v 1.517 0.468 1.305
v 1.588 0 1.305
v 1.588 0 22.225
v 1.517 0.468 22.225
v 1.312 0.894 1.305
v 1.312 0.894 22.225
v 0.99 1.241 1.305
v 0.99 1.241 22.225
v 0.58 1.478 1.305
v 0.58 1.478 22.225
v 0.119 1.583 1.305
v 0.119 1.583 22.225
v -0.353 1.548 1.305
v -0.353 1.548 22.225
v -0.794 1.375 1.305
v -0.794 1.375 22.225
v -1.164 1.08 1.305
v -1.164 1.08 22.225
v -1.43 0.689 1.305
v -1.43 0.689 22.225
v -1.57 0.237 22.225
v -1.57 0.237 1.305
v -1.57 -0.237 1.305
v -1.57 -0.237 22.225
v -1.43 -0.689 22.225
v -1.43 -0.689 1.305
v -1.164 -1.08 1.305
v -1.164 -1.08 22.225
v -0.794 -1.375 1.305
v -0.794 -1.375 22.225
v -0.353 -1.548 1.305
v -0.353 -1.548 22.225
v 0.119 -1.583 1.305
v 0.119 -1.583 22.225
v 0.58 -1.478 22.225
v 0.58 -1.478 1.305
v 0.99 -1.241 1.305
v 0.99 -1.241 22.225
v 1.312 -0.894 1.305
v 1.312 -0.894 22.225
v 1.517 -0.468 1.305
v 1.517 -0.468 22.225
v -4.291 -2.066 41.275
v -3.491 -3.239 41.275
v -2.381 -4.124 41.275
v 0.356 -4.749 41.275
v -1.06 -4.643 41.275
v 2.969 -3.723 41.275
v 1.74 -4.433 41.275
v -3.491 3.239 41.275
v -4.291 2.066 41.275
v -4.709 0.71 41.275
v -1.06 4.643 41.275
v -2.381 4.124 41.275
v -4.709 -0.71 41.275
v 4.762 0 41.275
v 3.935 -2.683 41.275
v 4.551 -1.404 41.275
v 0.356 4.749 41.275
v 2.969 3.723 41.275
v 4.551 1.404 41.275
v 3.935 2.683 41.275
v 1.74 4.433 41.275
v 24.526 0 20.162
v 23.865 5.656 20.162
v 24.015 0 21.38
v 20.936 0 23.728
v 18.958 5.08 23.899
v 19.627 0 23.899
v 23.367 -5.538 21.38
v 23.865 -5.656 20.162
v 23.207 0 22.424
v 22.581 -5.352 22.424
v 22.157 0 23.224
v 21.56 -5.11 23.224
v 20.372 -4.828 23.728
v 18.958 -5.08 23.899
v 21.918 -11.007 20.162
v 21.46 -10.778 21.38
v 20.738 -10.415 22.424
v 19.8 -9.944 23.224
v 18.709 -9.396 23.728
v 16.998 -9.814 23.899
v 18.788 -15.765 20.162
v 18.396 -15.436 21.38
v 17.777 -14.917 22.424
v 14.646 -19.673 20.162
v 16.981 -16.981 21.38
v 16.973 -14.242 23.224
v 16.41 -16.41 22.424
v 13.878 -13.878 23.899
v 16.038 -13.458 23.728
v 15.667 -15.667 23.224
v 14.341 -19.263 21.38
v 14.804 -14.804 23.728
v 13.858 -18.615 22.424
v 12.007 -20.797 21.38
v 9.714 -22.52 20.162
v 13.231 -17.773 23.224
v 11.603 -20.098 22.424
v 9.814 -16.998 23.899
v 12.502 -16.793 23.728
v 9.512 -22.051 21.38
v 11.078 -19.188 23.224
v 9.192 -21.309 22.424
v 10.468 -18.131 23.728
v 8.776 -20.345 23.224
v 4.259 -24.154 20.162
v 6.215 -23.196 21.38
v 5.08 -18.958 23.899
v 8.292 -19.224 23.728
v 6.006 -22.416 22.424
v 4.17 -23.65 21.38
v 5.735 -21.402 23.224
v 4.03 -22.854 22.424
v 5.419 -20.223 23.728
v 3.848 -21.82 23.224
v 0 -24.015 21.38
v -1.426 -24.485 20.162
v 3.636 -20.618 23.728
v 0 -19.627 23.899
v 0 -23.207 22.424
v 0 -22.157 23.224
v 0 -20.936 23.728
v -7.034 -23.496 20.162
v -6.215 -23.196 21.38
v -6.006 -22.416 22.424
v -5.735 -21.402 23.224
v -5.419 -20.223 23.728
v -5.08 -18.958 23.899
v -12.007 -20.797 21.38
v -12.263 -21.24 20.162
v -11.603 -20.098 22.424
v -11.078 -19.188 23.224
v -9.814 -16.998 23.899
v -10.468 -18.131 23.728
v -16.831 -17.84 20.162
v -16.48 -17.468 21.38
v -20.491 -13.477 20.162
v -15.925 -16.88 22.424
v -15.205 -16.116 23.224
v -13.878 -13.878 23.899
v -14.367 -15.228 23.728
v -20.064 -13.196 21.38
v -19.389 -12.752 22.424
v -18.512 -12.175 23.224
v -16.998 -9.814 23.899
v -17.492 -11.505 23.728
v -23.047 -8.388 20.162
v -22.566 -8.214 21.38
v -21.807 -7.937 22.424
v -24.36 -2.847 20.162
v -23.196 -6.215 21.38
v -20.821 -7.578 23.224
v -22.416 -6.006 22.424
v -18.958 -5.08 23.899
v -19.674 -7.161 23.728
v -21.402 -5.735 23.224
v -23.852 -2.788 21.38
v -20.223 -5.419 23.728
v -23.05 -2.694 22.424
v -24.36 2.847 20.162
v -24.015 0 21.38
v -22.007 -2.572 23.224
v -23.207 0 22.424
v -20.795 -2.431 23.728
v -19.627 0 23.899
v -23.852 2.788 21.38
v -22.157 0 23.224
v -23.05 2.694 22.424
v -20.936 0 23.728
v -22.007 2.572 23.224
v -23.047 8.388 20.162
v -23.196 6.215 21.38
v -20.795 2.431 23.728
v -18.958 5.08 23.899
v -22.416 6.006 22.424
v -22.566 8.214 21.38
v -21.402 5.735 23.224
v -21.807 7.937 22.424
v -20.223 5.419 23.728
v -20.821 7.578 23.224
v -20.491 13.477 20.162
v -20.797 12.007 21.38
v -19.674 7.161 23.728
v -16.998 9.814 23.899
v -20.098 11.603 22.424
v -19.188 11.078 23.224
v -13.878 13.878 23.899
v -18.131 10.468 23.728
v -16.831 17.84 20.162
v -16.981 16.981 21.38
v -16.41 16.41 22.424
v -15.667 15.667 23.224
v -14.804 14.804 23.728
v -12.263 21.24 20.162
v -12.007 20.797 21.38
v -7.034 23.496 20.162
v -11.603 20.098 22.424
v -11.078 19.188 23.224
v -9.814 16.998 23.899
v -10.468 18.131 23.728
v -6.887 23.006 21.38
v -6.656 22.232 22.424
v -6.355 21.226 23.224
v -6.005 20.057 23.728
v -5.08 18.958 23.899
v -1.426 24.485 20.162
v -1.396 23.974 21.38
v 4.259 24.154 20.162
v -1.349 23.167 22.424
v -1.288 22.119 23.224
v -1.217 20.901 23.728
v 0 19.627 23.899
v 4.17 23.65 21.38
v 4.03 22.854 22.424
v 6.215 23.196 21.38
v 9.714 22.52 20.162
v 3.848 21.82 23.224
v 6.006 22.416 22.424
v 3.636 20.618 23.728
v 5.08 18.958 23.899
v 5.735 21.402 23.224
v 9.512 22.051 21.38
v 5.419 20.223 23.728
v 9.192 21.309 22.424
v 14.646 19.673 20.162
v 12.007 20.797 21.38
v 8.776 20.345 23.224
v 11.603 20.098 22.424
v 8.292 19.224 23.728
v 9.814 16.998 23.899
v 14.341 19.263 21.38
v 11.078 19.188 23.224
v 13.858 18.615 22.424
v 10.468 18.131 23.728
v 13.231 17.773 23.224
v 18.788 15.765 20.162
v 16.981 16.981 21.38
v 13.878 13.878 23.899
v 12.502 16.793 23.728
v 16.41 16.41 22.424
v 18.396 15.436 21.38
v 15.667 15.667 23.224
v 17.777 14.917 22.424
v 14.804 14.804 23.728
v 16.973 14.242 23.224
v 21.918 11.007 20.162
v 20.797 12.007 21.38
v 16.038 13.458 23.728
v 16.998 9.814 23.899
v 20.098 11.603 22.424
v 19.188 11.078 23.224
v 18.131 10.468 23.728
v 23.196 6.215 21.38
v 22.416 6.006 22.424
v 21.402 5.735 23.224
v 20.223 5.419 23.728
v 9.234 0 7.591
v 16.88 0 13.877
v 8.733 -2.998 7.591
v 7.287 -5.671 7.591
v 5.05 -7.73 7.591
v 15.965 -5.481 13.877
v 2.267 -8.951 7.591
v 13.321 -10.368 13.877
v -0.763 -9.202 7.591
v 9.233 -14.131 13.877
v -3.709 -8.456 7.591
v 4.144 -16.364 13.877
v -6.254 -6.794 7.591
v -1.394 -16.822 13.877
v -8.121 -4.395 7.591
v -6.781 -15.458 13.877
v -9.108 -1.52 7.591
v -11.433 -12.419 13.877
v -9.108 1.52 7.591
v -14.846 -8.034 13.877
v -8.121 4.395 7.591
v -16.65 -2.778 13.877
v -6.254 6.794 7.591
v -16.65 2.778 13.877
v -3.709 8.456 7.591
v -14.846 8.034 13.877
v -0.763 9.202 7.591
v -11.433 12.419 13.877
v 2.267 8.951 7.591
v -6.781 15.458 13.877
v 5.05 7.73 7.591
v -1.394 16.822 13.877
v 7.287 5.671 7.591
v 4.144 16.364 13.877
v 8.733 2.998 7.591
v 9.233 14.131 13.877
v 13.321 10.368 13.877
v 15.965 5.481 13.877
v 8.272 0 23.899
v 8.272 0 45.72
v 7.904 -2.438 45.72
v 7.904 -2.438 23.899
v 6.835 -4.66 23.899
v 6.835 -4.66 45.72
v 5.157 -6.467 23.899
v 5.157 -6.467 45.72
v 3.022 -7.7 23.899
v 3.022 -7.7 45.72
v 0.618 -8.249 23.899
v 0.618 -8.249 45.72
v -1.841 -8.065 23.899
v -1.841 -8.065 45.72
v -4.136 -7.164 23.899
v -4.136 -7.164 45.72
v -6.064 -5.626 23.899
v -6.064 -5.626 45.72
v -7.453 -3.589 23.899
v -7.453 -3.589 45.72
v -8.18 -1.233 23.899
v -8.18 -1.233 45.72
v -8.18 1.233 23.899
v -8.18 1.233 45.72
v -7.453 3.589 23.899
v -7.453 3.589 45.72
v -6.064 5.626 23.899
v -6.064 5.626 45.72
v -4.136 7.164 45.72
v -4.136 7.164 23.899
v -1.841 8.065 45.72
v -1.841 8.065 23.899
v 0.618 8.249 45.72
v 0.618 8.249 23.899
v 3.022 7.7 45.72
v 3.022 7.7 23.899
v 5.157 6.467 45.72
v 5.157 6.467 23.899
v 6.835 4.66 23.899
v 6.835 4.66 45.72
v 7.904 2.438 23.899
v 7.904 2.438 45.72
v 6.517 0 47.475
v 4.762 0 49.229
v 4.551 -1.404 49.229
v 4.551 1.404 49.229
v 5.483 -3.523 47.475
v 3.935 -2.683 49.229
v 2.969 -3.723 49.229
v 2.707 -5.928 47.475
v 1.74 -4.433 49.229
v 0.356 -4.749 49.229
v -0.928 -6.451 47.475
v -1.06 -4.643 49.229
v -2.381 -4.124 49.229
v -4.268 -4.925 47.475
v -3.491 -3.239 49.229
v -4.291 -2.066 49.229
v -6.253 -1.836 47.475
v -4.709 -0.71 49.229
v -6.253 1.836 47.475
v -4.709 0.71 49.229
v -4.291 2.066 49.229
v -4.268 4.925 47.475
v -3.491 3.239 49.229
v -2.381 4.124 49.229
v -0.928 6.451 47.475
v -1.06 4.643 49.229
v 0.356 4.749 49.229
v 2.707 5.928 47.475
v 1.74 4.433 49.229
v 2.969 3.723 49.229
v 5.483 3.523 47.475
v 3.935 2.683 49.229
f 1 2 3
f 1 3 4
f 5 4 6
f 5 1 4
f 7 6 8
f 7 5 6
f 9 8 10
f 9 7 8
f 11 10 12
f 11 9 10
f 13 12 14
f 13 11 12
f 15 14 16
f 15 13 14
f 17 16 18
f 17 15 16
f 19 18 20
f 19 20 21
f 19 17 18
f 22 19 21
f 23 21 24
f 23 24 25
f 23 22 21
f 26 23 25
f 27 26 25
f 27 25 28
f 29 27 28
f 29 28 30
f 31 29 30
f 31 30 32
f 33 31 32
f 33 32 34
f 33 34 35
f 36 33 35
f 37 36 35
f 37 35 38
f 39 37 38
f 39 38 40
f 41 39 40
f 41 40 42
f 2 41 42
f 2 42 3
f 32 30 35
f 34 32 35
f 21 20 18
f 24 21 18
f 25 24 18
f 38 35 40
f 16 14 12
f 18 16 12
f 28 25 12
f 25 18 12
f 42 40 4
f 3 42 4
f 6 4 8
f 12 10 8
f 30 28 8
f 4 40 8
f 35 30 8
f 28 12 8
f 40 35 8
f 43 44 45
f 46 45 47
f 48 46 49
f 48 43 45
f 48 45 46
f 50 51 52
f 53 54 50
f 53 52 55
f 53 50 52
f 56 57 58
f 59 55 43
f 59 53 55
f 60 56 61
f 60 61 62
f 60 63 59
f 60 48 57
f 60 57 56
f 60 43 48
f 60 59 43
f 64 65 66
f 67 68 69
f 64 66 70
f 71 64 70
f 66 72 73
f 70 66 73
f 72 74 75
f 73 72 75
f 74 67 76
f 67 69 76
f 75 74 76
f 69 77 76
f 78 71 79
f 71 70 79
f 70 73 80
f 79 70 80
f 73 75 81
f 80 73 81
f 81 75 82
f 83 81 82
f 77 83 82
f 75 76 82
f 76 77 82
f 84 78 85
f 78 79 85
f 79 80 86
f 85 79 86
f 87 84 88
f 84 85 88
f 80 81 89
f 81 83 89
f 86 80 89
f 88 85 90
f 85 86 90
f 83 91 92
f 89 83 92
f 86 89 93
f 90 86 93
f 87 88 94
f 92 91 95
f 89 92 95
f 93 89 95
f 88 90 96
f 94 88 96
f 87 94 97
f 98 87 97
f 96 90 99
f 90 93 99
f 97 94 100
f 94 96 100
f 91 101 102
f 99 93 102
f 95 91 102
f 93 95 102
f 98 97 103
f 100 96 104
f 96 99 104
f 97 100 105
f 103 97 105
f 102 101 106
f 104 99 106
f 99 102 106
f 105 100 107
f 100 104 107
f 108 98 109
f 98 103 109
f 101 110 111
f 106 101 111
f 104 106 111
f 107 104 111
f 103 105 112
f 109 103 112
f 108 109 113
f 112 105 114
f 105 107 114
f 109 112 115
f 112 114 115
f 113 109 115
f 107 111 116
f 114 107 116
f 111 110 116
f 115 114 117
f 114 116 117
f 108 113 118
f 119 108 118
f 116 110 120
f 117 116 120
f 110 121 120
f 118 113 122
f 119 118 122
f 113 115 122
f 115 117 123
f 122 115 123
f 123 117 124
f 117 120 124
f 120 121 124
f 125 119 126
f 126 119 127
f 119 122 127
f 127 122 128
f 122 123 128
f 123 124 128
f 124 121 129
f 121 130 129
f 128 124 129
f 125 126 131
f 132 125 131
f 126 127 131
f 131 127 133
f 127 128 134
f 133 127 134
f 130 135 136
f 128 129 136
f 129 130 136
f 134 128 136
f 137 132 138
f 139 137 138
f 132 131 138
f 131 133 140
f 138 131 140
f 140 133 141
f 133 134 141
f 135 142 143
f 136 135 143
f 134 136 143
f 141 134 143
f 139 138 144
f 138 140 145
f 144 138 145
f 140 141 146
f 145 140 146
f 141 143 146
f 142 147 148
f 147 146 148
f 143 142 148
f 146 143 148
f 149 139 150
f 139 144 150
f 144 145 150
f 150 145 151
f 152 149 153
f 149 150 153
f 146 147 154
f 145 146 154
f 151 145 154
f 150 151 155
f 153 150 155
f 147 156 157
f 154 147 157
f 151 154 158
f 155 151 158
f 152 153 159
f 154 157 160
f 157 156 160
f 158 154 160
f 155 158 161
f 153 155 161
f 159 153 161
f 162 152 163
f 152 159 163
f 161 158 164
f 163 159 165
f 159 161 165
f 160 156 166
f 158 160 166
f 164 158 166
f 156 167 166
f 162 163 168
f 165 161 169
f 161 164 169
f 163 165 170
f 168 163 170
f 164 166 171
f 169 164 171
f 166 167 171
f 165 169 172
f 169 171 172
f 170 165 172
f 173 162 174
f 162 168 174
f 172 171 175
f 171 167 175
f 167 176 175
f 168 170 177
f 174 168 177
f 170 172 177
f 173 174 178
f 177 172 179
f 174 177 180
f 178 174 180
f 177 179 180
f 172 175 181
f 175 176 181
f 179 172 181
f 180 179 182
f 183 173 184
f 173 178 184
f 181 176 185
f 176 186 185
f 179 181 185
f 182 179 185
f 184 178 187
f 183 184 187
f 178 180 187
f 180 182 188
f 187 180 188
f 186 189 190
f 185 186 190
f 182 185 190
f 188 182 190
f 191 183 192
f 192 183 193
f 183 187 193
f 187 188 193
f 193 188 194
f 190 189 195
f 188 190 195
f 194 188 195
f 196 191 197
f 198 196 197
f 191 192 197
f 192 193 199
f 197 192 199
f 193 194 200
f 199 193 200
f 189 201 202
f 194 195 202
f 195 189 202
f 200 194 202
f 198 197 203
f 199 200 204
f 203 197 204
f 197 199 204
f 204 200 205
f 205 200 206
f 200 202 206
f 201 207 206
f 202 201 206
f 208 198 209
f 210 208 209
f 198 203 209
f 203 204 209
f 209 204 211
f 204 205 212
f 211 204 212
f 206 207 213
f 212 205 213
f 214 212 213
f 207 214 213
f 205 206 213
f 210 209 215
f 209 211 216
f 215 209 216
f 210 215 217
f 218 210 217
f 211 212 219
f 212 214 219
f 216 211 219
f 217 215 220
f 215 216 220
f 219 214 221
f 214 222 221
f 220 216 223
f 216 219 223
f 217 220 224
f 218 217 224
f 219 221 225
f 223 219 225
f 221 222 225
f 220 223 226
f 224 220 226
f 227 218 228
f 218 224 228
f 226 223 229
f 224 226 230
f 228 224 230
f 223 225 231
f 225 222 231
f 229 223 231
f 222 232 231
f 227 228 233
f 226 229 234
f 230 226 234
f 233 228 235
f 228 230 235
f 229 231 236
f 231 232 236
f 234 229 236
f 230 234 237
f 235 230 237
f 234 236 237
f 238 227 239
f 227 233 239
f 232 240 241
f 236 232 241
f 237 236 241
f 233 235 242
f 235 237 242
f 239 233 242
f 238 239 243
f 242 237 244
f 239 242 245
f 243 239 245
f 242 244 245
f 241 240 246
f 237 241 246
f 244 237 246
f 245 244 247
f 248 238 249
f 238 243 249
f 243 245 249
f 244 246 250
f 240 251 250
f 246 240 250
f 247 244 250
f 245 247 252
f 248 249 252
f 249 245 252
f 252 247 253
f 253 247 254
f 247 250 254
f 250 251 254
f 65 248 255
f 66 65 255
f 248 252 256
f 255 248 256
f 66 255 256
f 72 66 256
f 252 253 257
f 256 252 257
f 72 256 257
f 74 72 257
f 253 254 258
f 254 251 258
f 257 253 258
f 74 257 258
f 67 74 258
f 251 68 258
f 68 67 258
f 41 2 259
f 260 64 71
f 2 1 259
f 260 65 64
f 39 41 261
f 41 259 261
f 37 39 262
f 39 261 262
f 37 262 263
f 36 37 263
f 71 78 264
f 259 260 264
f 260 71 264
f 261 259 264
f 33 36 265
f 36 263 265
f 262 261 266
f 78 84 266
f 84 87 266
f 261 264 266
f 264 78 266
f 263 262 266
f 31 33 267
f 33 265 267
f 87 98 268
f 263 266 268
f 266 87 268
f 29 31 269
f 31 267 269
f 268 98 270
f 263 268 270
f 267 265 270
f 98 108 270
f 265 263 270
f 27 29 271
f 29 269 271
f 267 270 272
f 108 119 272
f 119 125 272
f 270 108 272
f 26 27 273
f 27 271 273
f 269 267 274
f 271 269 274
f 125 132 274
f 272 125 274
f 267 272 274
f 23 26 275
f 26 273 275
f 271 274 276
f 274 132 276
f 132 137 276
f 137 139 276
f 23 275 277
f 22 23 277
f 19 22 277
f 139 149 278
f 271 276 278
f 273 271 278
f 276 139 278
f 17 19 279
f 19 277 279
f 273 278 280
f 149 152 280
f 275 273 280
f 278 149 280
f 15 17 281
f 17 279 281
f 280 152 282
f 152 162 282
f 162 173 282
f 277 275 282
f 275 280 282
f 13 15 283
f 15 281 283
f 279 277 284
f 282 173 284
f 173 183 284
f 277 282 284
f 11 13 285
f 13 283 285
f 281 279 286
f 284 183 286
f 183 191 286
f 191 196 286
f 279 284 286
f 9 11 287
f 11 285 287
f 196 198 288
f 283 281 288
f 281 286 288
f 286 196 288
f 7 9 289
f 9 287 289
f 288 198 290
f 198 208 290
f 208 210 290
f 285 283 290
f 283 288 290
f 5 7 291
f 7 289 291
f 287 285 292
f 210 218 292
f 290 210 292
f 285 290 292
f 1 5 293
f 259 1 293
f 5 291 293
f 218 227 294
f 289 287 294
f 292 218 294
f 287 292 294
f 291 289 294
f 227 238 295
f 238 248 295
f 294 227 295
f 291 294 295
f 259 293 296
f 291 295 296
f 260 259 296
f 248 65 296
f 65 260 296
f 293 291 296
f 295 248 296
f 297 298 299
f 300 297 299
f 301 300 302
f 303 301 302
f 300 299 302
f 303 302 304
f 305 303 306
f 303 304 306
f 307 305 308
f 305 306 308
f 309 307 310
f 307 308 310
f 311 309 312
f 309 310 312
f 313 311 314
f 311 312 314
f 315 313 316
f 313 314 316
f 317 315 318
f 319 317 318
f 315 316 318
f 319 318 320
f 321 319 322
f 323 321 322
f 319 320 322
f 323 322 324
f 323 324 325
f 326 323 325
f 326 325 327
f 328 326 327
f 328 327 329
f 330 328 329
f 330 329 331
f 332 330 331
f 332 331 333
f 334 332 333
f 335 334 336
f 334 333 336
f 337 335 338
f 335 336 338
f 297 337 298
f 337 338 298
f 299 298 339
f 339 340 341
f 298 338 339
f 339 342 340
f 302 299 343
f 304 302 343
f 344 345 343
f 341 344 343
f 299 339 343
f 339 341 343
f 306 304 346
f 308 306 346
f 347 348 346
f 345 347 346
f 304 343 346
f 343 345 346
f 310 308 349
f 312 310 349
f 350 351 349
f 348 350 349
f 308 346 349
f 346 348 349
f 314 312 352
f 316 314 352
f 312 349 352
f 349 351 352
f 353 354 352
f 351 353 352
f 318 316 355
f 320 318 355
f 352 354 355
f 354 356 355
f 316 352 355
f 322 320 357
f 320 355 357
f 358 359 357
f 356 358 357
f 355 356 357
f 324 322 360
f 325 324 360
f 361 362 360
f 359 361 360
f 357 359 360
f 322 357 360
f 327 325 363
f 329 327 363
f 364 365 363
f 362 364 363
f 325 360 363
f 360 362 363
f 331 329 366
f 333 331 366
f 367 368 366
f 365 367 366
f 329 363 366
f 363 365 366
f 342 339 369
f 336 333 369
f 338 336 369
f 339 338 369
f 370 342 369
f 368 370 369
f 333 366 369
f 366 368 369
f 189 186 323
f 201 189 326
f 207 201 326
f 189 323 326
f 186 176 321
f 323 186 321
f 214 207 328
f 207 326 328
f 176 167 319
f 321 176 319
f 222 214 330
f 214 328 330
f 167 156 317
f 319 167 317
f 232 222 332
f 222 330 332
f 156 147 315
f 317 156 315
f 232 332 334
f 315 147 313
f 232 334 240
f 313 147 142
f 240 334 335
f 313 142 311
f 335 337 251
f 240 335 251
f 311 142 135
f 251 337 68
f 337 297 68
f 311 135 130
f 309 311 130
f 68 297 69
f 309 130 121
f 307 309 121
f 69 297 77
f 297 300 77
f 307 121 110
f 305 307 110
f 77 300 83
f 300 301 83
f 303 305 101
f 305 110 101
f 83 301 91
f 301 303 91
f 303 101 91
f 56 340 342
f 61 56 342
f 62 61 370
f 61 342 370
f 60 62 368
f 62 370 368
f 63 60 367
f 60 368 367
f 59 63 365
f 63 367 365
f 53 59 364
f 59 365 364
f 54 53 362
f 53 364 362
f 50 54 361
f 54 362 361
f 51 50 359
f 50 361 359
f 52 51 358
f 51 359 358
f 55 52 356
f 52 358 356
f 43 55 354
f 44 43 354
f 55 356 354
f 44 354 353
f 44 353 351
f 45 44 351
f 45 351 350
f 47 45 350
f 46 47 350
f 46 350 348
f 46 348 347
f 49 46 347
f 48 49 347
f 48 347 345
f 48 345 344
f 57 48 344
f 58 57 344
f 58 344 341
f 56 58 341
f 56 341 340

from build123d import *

# Parameters (mm, degrees)
F4_R     = 4.7625
F5_DEPTH = 9.525
F7_R     = 1.5875
F8_DEPTH = 22.225


# Not quite as in the source:
# - a fillet or chamfer that OpenCascade refuses, or shapes differently, is made with other operations: its cross-section is extruded or revolved along the edge and cut away or added


with BuildPart() as f2:
    # F0 (on Front) → F2 (revolve)
    with BuildSketch(Plane.XZ):
        Polygon((0, 50.8), (0, 0), (24.5263007426, 20.1624173125), (24.5263007426, 23.8990907568), (8.2719810307, 23.8990907568), (8.2719810307, 50.8), align=None)
    revolve(axis=Axis((0, 0, 25.4), (0, 0, -1)))

    # F3: fillet of radius 5.08 on 1 edges, made by hand

    # F3_s1 → F3_t2 (revolve, cut)
    with BuildSketch(Plane.XZ):
        with BuildLine():
            ThreePointArc((24.5263007426, 20.1624173125), (22.7079011169, 22.8583047213), (19.6271300205, 23.8990907568))
            Line((19.6271300205, 23.8990907568), (24.5263007426, 23.8990907568))
            Line((24.5263007426, 23.8990907568), (24.5263007426, 20.1624173125))
        make_face()
    revolve(axis=Axis((0, 0, 23.8990907568), (0, 0, -1)), mode=Mode.SUBTRACT)

    # F4 (on face) → F5 (cut)
    with BuildSketch(Plane.XY.offset(50.8)):
        Circle(F4_R)
    extrude(amount=-F5_DEPTH, mode=Mode.SUBTRACT)

    # F6: chamfer of 5.08 on 1 edges, made by hand

    # F6_s1 → F6_t2 (revolve, cut)
    with BuildSketch(Plane.XZ):
        Polygon((8.2719810307, 45.72), (3.1919810307, 50.8), (8.2719810307, 50.8), align=None)
    revolve(axis=Axis((0, 0, 50.8), (0, 0, -1)), mode=Mode.SUBTRACT)

    # F7 (on Top) → F8 (cut)
    with BuildSketch(Plane.XY):
        Circle(F7_R)
    extrude(amount=F8_DEPTH, mode=Mode.SUBTRACT)


solid = f2.part
